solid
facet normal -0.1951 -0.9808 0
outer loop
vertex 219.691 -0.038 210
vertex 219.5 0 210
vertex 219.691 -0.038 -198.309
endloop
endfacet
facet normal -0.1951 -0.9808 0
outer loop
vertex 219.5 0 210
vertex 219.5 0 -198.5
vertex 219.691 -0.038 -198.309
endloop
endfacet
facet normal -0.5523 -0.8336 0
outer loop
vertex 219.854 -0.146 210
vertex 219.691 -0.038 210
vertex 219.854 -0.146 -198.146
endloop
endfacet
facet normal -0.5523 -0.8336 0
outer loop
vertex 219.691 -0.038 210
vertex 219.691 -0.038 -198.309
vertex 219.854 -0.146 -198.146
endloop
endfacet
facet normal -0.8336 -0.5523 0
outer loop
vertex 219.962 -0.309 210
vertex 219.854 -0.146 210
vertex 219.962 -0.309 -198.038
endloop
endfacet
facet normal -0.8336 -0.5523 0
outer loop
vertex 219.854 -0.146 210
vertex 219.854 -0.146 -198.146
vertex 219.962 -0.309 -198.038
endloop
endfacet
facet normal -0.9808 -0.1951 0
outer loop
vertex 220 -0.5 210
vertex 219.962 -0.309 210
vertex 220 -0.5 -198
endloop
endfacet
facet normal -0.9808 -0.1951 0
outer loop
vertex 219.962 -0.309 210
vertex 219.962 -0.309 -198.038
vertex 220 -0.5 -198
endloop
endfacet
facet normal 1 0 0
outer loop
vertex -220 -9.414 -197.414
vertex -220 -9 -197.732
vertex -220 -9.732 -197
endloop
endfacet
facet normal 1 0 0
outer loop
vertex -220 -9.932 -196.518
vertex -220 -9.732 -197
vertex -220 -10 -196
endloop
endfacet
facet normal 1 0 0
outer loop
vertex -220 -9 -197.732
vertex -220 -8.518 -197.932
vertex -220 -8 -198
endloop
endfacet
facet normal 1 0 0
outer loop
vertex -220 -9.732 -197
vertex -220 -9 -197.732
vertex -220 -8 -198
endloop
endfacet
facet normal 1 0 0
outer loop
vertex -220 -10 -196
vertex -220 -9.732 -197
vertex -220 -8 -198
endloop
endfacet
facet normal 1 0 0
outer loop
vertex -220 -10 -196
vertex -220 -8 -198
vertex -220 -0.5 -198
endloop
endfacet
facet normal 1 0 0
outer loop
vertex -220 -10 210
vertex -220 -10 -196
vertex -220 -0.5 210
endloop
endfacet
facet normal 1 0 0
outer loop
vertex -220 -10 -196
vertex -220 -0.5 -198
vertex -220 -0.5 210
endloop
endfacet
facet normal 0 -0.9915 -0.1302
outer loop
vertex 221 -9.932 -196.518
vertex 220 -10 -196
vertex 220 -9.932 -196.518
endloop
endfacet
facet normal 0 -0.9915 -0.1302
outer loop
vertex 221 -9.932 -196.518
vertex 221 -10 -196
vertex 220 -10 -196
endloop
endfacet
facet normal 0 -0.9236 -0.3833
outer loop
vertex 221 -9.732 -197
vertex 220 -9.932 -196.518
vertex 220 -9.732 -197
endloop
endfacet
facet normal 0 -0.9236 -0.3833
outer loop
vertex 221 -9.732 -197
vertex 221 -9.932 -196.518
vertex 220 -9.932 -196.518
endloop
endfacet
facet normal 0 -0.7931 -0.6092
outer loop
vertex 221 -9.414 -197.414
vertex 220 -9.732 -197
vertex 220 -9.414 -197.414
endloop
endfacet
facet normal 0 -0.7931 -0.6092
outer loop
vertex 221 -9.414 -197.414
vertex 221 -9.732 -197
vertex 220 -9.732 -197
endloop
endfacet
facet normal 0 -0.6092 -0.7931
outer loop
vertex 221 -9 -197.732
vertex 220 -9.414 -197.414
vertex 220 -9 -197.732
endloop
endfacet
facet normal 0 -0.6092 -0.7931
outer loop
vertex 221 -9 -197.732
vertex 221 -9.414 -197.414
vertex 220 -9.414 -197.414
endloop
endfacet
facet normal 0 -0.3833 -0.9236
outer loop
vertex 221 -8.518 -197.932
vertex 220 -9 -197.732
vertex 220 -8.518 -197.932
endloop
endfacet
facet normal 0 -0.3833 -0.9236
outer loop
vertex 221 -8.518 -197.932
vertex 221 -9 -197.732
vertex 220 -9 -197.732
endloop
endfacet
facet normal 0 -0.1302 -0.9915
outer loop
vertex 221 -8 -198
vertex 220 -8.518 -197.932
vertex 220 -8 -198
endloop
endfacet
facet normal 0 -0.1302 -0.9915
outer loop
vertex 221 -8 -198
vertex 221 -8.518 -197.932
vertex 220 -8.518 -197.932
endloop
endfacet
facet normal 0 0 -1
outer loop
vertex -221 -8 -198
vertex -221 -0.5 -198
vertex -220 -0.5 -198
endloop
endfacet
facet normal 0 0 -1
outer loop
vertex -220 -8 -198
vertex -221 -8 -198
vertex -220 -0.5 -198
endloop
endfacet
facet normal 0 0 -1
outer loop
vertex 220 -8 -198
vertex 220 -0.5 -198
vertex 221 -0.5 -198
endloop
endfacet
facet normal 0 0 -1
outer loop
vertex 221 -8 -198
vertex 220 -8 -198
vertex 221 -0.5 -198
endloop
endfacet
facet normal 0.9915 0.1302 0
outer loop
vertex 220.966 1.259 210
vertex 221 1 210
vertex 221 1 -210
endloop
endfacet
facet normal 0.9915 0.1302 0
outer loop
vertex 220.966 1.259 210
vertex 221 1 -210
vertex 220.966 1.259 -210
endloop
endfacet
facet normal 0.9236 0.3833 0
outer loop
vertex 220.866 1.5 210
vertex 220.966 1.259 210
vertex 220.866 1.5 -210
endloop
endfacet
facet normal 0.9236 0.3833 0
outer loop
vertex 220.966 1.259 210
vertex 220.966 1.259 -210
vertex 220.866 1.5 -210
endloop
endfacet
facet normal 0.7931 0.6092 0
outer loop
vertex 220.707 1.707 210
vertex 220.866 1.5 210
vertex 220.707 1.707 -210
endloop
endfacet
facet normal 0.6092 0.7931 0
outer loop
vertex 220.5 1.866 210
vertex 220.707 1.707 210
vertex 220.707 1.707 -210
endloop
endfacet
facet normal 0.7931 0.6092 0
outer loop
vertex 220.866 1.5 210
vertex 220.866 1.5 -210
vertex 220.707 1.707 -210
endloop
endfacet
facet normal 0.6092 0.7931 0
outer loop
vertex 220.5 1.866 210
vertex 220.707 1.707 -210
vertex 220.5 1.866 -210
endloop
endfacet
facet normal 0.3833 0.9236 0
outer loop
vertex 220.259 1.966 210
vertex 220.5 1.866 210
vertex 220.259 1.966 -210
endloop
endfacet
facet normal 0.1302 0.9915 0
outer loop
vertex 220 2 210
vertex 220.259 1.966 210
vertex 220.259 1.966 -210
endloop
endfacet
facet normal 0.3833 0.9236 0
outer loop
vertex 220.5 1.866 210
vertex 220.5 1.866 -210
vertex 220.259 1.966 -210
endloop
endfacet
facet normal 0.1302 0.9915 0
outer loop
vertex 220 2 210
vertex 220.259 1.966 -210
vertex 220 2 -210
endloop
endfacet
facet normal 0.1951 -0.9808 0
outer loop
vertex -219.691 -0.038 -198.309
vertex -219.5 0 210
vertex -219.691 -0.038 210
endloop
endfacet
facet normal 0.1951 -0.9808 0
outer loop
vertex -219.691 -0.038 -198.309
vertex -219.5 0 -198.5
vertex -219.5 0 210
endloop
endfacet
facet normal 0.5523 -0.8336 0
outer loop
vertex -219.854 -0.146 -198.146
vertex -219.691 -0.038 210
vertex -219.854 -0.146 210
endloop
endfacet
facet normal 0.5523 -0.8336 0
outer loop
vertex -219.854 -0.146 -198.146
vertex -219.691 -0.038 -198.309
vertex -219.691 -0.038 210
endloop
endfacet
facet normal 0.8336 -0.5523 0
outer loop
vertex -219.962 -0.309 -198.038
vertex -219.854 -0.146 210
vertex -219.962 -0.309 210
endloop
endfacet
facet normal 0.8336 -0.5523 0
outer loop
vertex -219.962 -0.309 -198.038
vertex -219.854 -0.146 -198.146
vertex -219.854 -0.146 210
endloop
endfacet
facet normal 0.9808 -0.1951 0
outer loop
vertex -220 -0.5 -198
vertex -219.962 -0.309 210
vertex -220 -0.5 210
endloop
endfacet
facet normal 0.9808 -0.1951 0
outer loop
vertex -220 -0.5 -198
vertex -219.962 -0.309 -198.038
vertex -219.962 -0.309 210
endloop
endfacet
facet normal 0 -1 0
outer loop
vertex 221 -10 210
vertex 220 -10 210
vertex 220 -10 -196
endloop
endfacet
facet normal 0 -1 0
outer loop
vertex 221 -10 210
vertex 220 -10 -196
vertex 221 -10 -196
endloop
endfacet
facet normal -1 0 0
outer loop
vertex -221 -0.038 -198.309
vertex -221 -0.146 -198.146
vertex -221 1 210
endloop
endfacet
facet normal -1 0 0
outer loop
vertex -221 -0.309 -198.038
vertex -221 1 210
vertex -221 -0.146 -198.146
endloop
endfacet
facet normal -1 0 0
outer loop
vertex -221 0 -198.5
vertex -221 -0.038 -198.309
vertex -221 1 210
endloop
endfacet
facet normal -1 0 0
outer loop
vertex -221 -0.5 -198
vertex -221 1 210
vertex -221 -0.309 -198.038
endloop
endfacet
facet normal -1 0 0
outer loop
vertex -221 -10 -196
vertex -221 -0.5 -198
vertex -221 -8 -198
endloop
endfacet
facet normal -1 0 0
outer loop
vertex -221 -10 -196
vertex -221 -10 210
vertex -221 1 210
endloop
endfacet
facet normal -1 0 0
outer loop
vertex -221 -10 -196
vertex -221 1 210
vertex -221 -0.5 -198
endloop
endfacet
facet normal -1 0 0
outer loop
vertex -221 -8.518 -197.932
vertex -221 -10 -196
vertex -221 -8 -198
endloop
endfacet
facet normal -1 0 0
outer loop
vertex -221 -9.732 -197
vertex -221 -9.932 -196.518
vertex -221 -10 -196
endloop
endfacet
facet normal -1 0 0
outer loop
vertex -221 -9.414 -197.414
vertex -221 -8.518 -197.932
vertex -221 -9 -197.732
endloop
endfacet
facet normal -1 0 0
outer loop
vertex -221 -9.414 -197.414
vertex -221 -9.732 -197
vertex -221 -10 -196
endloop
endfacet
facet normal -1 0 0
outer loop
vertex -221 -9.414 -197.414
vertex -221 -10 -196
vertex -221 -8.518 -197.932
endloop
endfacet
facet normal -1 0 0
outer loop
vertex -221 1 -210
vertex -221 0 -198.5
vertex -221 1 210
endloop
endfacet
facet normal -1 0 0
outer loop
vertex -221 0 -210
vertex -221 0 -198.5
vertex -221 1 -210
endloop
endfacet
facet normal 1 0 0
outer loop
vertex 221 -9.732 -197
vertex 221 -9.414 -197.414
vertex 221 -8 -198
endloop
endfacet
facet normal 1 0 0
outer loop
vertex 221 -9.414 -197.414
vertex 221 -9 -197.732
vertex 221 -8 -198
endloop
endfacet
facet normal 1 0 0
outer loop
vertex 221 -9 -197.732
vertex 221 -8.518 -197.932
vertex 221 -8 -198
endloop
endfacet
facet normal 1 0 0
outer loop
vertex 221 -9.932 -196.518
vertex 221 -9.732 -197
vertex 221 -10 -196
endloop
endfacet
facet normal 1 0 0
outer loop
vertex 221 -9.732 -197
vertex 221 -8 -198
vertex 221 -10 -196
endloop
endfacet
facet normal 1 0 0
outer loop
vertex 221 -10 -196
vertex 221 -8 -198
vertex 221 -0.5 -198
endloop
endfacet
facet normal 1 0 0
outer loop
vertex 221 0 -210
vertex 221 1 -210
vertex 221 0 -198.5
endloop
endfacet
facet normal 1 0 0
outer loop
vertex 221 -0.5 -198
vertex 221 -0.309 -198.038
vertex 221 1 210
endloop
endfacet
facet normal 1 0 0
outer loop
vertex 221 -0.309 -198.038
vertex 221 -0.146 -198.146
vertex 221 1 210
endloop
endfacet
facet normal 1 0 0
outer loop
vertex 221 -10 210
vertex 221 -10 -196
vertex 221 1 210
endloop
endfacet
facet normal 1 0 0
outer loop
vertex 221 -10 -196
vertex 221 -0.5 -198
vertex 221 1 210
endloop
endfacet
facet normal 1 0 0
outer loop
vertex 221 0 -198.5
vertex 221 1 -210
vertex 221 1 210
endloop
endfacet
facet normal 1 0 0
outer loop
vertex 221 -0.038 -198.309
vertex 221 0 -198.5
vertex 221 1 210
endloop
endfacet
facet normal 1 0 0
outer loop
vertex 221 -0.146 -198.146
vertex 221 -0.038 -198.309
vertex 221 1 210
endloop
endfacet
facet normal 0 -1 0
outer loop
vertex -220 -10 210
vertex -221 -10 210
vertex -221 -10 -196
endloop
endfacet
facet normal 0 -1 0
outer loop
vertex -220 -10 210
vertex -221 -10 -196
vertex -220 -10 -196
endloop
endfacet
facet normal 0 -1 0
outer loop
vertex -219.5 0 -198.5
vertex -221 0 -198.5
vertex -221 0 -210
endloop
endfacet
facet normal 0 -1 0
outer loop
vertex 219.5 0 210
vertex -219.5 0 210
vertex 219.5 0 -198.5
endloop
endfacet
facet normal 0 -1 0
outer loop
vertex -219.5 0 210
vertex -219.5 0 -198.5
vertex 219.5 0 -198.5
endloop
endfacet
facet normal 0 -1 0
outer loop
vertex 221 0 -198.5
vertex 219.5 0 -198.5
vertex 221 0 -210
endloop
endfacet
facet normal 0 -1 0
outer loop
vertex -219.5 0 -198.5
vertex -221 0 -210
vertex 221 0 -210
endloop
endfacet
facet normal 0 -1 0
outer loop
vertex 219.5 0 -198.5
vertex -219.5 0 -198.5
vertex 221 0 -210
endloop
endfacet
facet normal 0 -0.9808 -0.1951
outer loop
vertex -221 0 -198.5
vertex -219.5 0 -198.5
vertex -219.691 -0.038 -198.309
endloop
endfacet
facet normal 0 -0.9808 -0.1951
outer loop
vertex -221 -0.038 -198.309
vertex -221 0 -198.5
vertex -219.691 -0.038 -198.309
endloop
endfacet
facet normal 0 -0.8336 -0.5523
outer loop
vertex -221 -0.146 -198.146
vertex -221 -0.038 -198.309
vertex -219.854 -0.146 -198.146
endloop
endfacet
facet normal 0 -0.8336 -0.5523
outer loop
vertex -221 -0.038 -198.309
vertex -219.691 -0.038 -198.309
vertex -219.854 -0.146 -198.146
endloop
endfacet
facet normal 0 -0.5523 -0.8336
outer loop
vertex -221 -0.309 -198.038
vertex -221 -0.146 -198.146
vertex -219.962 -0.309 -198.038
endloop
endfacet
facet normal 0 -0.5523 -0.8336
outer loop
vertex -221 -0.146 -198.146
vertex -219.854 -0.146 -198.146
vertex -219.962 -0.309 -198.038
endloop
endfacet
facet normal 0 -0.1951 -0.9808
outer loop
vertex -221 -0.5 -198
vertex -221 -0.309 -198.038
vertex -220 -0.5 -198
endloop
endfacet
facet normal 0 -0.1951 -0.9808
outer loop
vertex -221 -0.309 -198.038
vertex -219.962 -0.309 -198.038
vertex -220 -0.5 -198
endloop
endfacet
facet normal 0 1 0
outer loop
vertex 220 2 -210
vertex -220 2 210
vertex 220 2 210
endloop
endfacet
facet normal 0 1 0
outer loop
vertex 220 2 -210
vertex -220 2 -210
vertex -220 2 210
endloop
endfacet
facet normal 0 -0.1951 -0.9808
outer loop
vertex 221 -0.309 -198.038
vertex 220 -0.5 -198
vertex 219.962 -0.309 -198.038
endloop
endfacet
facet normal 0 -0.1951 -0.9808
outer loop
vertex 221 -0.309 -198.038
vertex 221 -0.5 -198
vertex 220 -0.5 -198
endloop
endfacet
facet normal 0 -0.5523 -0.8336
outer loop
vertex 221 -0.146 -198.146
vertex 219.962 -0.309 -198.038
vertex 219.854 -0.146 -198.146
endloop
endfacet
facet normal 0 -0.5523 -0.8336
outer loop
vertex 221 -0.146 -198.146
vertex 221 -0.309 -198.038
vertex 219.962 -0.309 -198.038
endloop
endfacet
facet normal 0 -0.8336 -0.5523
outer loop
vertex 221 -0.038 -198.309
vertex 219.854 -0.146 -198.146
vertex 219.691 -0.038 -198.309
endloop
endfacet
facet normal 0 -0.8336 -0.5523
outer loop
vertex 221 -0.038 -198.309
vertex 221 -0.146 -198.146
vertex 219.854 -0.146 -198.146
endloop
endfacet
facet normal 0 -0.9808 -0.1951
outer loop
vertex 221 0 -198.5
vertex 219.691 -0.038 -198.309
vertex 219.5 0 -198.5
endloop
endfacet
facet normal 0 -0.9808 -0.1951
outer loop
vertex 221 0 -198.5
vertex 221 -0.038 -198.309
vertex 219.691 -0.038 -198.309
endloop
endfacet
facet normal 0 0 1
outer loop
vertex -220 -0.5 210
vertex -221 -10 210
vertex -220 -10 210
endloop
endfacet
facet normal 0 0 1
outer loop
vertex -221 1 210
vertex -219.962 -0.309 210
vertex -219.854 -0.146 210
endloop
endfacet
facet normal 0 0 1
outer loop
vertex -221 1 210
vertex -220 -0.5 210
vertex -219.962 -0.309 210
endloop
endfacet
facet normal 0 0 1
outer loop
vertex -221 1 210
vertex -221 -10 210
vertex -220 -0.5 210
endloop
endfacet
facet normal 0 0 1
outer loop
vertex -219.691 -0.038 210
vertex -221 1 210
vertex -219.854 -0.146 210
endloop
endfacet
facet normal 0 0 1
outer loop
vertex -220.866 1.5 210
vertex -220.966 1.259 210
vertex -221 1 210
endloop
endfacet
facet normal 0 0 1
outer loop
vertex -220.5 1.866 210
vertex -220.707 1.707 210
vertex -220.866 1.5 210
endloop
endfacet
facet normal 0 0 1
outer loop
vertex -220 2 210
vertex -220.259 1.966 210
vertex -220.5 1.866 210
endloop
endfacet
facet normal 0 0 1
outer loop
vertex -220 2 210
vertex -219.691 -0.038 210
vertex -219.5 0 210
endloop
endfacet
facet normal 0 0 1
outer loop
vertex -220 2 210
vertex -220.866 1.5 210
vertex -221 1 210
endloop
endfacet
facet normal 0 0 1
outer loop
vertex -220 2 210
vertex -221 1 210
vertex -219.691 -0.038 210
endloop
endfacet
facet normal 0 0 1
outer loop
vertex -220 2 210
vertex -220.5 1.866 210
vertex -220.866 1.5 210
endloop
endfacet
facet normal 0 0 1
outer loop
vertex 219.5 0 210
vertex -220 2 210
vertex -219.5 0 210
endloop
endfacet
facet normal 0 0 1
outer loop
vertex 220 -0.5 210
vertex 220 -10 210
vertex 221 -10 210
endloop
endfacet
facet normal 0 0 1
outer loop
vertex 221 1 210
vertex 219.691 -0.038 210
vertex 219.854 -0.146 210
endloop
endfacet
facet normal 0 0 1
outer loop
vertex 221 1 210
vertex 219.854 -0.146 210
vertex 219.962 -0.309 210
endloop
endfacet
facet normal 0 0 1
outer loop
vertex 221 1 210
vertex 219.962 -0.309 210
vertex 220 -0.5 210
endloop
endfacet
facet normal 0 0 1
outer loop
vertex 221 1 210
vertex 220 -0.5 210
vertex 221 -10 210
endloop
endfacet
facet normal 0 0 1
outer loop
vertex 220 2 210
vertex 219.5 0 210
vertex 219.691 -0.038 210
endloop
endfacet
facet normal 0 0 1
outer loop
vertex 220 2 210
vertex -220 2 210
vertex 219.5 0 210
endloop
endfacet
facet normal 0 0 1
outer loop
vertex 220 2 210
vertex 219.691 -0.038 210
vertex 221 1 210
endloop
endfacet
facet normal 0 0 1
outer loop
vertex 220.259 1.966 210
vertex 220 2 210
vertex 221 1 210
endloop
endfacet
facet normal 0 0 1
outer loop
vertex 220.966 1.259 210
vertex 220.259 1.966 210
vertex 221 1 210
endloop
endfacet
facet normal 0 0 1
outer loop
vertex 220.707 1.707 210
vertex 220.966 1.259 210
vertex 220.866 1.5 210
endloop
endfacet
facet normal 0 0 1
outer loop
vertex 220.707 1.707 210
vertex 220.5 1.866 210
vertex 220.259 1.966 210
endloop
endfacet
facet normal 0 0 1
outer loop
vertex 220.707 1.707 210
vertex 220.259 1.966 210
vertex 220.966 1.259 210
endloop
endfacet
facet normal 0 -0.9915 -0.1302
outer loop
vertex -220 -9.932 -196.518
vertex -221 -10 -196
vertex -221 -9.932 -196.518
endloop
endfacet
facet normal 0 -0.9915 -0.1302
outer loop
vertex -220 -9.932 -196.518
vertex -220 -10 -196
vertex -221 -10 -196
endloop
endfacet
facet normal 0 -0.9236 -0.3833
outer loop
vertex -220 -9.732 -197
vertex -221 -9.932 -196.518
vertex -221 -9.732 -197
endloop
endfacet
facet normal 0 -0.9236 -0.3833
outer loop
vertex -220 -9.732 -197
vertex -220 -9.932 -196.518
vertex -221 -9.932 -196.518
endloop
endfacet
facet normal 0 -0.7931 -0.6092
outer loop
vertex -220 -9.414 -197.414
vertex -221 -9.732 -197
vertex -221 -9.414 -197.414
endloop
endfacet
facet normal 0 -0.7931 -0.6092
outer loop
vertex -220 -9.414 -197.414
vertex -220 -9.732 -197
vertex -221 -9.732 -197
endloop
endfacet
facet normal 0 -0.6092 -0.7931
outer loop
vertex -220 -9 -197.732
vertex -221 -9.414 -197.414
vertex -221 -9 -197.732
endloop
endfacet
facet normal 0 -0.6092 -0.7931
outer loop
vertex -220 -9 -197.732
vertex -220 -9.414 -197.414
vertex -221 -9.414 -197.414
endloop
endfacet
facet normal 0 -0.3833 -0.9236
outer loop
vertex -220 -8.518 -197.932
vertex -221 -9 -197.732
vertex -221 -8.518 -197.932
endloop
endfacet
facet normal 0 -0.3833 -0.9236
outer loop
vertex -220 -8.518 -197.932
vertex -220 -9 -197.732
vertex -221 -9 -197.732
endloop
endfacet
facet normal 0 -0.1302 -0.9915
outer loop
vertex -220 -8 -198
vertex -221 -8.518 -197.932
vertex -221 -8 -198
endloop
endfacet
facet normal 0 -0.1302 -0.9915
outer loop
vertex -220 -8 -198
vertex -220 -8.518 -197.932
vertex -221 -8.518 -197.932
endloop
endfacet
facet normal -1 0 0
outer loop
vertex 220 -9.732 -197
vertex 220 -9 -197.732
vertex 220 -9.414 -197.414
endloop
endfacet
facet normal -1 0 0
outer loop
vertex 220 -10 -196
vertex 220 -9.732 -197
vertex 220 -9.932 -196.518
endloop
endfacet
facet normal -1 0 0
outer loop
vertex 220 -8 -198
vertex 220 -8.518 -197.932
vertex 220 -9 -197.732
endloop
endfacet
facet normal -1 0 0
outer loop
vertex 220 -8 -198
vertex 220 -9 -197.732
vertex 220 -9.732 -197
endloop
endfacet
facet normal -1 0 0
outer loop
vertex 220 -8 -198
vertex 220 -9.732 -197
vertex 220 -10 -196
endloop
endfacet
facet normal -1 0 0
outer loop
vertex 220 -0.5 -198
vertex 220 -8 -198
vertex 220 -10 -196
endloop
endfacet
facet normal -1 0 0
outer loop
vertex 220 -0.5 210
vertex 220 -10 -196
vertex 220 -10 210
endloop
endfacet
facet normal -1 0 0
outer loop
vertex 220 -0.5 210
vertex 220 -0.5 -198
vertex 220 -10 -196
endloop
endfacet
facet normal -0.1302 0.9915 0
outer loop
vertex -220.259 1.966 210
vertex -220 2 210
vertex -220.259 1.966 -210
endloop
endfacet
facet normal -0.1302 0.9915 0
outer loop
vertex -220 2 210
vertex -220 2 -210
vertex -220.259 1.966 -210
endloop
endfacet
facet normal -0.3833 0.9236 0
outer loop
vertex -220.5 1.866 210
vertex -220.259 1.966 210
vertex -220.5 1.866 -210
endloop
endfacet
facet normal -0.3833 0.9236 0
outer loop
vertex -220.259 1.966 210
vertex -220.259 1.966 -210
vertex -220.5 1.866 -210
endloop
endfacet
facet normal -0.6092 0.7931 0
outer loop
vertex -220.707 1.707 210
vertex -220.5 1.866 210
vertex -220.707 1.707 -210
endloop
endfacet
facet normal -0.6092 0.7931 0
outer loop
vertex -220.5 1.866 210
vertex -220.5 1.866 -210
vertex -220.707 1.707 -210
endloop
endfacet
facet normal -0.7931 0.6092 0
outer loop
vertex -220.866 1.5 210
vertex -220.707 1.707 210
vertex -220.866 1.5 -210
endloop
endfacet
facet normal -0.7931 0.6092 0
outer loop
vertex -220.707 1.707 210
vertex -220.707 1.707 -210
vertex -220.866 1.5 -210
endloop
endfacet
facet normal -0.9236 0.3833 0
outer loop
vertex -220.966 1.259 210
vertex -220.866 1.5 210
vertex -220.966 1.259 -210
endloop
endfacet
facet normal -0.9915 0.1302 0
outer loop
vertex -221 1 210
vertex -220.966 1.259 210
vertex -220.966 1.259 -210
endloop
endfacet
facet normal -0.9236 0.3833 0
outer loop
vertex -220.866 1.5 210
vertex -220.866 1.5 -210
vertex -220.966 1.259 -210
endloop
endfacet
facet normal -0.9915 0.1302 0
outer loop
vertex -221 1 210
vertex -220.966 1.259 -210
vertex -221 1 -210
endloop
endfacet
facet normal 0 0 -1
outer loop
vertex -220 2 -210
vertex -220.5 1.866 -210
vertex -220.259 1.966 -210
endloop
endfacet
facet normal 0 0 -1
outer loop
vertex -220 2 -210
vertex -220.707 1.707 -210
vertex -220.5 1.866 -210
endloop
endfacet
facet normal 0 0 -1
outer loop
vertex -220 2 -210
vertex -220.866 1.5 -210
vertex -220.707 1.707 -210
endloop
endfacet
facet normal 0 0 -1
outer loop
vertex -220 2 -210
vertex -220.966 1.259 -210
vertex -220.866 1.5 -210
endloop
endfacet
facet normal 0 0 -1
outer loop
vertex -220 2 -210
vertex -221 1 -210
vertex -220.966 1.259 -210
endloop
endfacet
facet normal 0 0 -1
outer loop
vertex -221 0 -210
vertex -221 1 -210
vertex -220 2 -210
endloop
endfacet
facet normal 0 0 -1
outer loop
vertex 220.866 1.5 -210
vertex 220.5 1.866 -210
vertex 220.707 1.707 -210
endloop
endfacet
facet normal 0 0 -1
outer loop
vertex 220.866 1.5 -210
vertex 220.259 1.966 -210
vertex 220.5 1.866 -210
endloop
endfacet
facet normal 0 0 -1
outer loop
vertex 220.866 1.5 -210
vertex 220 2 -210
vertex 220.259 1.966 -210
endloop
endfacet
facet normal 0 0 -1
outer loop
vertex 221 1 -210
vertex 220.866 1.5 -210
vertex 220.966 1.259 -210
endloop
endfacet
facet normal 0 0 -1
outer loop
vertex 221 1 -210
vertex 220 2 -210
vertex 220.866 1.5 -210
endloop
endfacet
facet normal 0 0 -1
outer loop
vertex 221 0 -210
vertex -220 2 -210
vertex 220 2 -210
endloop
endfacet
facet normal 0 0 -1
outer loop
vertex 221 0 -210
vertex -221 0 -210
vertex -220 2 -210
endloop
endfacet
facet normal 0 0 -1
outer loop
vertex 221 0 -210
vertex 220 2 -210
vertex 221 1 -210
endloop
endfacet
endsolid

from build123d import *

# Parameters (mm, degrees)
SKETCH1_W           = 442
SKETCH1_H           = 420
BOSS_EXTRUDE1_DEPTH = 2
SKETCH2_W           = 1
SKETCH2_H           = 408
BOSS_EXTRUDE2_DEPTH = 10
FILLET1_R           = 2
FILLET2_R           = 0.5
FILLET3_R           = 1
FILLET4_R           = 0.5


with BuildPart() as part:
    # Sketch1 → Boss-Extrude1 (new body)
    with BuildSketch(Plane(origin=(0, 0, 0), x_dir=(1, 0, 0), z_dir=(0, 1, 0))):
        Rectangle(SKETCH1_W, SKETCH1_H)
    extrude(amount=BOSS_EXTRUDE1_DEPTH)

    # Sketch2 → Boss-Extrude2 (add)
    with BuildSketch(Plane.XZ):
        with Locations((220.5, 6)):
            Rectangle(SKETCH2_W, SKETCH2_H)
        with Locations((-220.5, 6)):
            Rectangle(SKETCH2_W, SKETCH2_H)
    extrude(amount=BOSS_EXTRUDE2_DEPTH)

    # Fillet1
    fillet1_edges = [part.edges().sort_by_distance(p)[0] for p in [
        (-220.5, -10, -198),
        (220.5, -10, -198),
    ]]
    fillet(fillet1_edges, radius=FILLET1_R)

    # Fillet2
    fillet2_edges = [part.edges().sort_by_distance(p)[0] for p in [
        (-220.5, 0, -198),
        (220.5, 0, -198),
    ]]
    fillet(fillet2_edges, radius=FILLET2_R)

    # Fillet3
    fillet3_edges = [part.edges().sort_by_distance(p)[0] for p in [
        (-221, 2, 0),
        (221, 2, 0),
    ]]
    fillet(fillet3_edges, radius=FILLET3_R)

    # Fillet4
    fillet4_edges = [part.edges().sort_by_distance(p)[0] for p in [
        (-220, 0, 5.75),
        (220, 0, 5.75),
    ]]
    fillet(fillet4_edges, radius=FILLET4_R)


solid = part.part
